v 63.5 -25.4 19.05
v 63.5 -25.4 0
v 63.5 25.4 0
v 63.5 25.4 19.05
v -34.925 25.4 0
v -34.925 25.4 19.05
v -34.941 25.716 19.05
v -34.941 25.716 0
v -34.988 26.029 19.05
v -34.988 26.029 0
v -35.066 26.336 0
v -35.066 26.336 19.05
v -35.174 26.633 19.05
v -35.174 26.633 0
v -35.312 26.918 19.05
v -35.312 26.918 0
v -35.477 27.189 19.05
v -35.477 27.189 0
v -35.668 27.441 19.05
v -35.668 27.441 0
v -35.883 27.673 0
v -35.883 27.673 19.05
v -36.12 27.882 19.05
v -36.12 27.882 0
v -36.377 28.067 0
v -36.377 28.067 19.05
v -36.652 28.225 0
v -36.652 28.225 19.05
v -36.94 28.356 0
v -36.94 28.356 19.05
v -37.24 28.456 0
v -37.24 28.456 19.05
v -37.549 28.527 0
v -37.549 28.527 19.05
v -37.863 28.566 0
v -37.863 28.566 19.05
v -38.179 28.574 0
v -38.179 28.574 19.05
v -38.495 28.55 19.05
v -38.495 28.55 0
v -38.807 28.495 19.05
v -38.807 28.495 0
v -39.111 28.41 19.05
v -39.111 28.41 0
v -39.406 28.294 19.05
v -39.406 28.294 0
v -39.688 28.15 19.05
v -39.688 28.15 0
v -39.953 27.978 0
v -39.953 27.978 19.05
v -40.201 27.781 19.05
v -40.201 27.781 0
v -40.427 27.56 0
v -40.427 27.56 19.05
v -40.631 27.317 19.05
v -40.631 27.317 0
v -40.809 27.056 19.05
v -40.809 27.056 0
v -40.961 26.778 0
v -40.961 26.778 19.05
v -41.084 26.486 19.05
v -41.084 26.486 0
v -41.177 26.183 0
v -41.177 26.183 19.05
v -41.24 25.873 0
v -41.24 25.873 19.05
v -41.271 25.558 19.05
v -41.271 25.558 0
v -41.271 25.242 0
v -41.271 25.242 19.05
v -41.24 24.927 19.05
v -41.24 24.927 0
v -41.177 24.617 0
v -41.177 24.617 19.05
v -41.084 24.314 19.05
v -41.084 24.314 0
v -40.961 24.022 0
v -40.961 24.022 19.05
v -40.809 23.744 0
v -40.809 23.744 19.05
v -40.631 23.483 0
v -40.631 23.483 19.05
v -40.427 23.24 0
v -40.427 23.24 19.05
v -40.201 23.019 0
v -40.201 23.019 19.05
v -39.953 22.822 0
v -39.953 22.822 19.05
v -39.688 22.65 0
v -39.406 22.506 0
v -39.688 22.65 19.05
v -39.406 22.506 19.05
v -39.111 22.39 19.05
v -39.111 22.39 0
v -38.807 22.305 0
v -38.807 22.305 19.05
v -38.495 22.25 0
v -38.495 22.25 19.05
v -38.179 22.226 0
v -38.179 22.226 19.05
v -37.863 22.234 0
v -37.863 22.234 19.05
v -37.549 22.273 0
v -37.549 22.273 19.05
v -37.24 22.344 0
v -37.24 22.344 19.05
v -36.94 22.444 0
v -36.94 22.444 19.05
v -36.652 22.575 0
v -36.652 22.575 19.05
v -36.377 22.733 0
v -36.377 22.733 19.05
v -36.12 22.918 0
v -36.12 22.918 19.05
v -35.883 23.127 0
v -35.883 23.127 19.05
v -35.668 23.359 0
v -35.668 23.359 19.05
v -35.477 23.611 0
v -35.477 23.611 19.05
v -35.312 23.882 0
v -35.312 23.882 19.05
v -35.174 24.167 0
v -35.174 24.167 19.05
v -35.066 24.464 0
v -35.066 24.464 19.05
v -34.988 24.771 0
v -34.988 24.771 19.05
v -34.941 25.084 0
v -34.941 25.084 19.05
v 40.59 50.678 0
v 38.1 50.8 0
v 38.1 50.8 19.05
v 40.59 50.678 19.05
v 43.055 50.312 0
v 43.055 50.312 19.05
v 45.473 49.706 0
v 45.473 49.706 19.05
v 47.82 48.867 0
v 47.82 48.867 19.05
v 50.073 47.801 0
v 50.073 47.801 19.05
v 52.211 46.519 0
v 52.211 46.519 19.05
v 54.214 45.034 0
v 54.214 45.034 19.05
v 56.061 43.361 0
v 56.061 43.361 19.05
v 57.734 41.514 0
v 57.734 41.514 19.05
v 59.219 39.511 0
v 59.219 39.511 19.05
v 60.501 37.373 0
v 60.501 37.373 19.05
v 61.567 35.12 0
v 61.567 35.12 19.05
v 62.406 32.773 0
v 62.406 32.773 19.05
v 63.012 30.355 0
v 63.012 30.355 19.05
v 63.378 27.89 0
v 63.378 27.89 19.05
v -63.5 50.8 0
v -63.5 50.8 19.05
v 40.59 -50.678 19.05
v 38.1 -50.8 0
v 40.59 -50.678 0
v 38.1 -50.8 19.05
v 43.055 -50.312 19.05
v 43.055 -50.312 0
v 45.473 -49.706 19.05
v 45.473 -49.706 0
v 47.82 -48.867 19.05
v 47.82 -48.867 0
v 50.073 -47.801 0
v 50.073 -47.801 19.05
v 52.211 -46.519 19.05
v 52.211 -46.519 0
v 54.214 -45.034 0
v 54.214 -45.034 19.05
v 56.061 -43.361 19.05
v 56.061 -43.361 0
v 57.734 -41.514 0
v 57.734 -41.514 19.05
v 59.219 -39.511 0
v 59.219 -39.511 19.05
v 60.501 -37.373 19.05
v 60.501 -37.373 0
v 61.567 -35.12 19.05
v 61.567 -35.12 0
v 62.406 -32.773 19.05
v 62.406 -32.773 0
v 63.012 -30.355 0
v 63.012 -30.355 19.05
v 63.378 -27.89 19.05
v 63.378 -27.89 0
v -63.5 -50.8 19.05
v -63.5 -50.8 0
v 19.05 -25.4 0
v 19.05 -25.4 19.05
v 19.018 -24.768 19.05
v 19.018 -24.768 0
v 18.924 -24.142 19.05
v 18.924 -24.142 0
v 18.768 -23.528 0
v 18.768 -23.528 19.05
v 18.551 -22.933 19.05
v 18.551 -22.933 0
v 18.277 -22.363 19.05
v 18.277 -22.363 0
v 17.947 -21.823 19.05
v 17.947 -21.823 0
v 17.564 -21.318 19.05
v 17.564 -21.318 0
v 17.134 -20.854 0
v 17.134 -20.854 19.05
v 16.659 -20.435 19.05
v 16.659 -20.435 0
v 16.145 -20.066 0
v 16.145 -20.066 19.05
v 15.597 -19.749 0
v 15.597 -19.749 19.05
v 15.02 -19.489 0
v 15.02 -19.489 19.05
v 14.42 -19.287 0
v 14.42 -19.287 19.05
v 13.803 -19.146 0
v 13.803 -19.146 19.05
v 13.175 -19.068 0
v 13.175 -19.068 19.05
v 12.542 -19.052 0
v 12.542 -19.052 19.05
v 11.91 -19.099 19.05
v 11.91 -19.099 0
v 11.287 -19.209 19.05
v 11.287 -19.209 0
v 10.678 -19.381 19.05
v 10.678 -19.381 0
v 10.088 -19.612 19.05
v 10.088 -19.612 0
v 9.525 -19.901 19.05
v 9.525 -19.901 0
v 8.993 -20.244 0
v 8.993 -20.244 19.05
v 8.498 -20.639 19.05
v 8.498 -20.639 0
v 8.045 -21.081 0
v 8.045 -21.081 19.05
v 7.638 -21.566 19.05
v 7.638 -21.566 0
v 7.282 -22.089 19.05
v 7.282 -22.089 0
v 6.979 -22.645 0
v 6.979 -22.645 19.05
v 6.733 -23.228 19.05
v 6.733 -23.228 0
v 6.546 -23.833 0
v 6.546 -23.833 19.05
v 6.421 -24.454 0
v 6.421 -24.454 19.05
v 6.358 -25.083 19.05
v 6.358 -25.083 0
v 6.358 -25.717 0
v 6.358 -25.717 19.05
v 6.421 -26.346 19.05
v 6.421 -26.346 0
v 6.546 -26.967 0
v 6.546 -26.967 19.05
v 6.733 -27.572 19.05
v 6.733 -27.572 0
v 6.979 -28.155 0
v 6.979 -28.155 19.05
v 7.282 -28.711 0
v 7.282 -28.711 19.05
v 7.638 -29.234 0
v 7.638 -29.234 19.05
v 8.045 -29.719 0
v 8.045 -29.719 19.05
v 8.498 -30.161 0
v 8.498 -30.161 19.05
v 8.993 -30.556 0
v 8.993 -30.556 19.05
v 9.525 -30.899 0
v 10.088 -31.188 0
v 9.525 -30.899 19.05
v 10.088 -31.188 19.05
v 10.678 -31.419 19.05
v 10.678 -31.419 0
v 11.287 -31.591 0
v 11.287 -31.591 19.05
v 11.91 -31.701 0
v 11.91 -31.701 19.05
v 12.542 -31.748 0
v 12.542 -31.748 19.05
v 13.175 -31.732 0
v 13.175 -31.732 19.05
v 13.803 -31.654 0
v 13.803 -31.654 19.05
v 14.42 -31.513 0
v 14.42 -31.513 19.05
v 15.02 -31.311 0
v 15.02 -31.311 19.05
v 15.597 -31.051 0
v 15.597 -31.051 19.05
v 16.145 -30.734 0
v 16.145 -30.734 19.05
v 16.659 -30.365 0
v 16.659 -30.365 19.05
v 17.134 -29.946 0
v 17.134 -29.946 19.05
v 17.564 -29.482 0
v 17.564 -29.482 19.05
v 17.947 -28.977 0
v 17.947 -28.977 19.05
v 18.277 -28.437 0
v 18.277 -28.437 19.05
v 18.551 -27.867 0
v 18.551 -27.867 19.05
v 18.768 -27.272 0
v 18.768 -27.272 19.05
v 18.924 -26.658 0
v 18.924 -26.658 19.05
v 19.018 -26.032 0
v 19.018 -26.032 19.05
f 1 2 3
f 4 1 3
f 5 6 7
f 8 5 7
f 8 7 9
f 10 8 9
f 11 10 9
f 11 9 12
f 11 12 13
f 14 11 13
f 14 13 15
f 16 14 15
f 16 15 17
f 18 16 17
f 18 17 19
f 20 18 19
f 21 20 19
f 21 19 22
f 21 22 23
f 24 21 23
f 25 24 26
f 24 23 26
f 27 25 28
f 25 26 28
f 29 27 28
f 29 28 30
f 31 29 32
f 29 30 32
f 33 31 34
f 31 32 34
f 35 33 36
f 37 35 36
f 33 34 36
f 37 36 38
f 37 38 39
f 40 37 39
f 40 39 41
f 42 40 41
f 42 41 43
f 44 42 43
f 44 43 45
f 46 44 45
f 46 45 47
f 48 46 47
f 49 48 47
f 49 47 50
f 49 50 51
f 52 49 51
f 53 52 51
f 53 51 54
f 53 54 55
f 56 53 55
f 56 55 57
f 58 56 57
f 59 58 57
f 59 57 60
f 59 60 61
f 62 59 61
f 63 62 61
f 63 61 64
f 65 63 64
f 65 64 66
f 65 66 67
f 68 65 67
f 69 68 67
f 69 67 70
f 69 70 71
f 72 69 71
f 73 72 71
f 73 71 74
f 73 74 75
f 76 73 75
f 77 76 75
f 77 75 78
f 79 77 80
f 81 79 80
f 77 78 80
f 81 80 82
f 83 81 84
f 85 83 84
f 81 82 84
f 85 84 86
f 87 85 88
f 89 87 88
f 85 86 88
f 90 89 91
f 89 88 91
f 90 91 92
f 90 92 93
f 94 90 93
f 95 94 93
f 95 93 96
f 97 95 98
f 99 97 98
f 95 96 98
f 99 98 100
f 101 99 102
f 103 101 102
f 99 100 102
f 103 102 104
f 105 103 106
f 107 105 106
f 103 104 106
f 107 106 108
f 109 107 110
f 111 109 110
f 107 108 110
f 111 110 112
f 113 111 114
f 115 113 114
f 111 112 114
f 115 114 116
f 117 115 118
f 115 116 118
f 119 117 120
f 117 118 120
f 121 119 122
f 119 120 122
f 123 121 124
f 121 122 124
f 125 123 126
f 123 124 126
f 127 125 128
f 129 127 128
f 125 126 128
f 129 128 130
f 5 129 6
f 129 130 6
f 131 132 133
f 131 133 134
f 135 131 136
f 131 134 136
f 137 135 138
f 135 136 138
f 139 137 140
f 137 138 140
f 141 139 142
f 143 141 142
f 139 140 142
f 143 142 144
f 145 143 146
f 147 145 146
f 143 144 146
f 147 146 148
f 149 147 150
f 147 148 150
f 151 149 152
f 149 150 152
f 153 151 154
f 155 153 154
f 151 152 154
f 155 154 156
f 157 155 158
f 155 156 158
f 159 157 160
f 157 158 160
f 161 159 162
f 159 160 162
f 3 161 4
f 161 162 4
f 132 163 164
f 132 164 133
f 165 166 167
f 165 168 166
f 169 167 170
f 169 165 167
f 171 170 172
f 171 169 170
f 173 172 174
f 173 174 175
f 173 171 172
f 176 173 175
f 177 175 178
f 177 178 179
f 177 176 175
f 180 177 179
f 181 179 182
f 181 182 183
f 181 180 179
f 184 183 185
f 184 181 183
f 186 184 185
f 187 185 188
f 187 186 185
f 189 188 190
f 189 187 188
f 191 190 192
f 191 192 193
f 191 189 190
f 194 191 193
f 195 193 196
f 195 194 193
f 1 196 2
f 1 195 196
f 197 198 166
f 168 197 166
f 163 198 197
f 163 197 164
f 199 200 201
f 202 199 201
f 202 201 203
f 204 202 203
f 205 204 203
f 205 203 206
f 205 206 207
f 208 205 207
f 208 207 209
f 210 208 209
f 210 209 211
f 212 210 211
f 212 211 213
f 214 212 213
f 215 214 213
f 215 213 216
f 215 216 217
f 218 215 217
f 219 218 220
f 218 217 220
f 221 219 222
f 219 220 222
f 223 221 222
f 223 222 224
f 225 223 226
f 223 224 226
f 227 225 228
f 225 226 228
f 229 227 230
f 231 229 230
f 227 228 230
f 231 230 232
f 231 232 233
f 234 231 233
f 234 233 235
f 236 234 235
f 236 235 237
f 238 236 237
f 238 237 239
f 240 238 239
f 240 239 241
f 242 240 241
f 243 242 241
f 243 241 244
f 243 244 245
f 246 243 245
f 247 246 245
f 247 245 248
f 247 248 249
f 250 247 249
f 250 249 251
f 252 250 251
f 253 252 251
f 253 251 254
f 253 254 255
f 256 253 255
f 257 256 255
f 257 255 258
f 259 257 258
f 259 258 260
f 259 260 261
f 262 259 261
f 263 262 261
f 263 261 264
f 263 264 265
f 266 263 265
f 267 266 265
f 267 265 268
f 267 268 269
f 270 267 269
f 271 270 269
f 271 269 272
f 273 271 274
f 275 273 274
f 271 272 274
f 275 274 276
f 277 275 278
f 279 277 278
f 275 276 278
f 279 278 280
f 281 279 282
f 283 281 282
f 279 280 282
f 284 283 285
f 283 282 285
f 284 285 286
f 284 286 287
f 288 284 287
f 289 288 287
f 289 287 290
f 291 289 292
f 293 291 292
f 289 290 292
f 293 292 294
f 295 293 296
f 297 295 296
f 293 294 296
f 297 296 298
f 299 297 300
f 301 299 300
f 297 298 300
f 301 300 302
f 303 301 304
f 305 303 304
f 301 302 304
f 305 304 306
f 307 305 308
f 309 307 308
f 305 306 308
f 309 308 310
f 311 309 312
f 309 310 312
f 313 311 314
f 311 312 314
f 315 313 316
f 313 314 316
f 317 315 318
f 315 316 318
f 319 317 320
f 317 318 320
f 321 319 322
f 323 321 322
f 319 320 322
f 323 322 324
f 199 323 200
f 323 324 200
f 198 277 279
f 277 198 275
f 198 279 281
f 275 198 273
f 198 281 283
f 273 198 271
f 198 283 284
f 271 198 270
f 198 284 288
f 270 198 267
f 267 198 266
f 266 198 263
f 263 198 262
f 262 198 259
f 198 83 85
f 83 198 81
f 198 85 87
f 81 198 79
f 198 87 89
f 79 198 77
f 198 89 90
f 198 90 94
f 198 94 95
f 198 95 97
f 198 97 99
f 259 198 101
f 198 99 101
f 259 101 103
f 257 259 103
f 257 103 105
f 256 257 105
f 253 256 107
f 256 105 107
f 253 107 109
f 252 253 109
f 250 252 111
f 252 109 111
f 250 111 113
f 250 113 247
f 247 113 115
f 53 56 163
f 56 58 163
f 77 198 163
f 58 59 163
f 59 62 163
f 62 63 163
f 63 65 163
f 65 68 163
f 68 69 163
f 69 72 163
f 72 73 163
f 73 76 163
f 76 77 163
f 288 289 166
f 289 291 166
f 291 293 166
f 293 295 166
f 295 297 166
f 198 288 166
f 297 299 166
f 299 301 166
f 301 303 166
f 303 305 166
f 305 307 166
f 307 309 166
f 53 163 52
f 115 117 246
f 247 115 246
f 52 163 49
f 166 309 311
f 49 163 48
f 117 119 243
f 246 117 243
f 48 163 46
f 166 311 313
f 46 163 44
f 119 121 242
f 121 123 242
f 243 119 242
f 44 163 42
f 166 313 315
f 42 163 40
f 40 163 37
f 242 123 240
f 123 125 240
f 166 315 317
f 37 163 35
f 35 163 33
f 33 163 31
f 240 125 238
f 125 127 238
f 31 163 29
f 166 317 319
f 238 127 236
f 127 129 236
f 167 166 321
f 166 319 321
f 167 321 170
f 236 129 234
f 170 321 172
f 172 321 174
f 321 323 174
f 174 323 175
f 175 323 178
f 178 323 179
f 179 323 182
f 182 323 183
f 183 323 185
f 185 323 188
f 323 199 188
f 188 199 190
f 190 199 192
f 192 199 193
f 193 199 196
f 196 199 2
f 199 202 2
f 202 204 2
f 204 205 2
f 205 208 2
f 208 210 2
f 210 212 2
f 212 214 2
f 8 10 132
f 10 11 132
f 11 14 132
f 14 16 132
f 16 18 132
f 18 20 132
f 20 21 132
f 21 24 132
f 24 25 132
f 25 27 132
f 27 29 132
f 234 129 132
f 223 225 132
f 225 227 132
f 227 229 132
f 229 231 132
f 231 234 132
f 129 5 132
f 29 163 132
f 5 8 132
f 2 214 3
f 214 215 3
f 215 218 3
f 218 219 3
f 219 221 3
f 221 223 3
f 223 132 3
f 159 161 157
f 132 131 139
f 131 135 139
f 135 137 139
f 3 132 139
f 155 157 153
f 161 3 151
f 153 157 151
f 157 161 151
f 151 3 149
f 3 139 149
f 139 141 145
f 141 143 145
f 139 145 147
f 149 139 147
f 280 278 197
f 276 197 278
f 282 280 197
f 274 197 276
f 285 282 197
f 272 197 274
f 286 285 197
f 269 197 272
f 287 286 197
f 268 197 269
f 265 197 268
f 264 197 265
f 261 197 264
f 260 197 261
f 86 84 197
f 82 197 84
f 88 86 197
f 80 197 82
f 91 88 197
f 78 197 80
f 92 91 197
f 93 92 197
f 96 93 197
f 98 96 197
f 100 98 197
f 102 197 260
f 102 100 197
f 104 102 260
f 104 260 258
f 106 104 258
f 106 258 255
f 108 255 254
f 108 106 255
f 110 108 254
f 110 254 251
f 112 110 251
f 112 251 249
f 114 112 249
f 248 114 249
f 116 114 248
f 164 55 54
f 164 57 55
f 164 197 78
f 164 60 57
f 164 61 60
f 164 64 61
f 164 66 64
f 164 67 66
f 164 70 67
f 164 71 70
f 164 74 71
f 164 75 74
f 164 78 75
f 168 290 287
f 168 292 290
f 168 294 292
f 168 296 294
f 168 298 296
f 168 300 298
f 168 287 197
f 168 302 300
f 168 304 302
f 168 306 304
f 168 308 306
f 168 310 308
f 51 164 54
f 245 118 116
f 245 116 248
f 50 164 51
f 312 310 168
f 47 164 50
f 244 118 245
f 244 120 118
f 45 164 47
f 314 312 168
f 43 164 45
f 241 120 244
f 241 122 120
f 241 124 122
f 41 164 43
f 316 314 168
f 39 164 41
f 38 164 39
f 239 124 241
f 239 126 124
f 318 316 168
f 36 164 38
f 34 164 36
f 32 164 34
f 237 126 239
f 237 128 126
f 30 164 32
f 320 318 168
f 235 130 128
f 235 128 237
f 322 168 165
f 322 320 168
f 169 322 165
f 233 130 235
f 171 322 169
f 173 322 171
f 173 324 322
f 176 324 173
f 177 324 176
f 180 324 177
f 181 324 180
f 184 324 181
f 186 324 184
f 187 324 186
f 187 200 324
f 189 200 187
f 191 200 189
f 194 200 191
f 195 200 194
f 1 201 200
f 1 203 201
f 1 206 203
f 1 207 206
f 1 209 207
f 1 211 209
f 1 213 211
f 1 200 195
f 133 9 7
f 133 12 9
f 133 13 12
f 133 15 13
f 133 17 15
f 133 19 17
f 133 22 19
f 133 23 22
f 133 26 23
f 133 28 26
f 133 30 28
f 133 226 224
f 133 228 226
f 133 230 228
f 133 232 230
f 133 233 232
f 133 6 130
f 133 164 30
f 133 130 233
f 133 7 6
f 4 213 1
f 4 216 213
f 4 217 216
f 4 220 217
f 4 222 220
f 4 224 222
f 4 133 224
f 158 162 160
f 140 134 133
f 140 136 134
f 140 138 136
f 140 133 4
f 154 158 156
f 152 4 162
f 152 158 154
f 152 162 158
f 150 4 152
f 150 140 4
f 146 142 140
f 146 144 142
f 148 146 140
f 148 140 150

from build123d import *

# Parameters (mm, degrees)
F0_W     = 127
F0_H     = 101.6
F1_DEPTH = 19.05
F2_R     = 3.175
F3_DEPTH = 25.4
F4_R     = 6.35
F5_DEPTH = 25.4
F6_R     = 25.4


with BuildPart() as f1:
    # F0 (on Top) → F1 (new body)
    with BuildSketch(Plane.XY):
        Rectangle(F0_W, F0_H)
    extrude(amount=F1_DEPTH)

    # F2 (on face) → F3 (cut)
    with BuildSketch(Plane.XY.offset(19.05)):
        with Locations((-38.1, 25.4)):
            Circle(F2_R)
    extrude(amount=-F3_DEPTH, mode=Mode.SUBTRACT)

    # F4 (on face) → F5 (cut)
    with BuildSketch(Plane.XY.offset(19.05)):
        with Locations((12.7, -25.4)):
            Circle(F4_R)
    extrude(amount=-F5_DEPTH, mode=Mode.SUBTRACT)

    # F6
    f6_edges = [f1.edges().sort_by_distance(p)[0] for p in [
        (63.5, -50.8, 9.525),
        (63.5, 50.8, 9.525),
    ]]
    fillet(f6_edges, radius=F6_R)


solid = f1.part
